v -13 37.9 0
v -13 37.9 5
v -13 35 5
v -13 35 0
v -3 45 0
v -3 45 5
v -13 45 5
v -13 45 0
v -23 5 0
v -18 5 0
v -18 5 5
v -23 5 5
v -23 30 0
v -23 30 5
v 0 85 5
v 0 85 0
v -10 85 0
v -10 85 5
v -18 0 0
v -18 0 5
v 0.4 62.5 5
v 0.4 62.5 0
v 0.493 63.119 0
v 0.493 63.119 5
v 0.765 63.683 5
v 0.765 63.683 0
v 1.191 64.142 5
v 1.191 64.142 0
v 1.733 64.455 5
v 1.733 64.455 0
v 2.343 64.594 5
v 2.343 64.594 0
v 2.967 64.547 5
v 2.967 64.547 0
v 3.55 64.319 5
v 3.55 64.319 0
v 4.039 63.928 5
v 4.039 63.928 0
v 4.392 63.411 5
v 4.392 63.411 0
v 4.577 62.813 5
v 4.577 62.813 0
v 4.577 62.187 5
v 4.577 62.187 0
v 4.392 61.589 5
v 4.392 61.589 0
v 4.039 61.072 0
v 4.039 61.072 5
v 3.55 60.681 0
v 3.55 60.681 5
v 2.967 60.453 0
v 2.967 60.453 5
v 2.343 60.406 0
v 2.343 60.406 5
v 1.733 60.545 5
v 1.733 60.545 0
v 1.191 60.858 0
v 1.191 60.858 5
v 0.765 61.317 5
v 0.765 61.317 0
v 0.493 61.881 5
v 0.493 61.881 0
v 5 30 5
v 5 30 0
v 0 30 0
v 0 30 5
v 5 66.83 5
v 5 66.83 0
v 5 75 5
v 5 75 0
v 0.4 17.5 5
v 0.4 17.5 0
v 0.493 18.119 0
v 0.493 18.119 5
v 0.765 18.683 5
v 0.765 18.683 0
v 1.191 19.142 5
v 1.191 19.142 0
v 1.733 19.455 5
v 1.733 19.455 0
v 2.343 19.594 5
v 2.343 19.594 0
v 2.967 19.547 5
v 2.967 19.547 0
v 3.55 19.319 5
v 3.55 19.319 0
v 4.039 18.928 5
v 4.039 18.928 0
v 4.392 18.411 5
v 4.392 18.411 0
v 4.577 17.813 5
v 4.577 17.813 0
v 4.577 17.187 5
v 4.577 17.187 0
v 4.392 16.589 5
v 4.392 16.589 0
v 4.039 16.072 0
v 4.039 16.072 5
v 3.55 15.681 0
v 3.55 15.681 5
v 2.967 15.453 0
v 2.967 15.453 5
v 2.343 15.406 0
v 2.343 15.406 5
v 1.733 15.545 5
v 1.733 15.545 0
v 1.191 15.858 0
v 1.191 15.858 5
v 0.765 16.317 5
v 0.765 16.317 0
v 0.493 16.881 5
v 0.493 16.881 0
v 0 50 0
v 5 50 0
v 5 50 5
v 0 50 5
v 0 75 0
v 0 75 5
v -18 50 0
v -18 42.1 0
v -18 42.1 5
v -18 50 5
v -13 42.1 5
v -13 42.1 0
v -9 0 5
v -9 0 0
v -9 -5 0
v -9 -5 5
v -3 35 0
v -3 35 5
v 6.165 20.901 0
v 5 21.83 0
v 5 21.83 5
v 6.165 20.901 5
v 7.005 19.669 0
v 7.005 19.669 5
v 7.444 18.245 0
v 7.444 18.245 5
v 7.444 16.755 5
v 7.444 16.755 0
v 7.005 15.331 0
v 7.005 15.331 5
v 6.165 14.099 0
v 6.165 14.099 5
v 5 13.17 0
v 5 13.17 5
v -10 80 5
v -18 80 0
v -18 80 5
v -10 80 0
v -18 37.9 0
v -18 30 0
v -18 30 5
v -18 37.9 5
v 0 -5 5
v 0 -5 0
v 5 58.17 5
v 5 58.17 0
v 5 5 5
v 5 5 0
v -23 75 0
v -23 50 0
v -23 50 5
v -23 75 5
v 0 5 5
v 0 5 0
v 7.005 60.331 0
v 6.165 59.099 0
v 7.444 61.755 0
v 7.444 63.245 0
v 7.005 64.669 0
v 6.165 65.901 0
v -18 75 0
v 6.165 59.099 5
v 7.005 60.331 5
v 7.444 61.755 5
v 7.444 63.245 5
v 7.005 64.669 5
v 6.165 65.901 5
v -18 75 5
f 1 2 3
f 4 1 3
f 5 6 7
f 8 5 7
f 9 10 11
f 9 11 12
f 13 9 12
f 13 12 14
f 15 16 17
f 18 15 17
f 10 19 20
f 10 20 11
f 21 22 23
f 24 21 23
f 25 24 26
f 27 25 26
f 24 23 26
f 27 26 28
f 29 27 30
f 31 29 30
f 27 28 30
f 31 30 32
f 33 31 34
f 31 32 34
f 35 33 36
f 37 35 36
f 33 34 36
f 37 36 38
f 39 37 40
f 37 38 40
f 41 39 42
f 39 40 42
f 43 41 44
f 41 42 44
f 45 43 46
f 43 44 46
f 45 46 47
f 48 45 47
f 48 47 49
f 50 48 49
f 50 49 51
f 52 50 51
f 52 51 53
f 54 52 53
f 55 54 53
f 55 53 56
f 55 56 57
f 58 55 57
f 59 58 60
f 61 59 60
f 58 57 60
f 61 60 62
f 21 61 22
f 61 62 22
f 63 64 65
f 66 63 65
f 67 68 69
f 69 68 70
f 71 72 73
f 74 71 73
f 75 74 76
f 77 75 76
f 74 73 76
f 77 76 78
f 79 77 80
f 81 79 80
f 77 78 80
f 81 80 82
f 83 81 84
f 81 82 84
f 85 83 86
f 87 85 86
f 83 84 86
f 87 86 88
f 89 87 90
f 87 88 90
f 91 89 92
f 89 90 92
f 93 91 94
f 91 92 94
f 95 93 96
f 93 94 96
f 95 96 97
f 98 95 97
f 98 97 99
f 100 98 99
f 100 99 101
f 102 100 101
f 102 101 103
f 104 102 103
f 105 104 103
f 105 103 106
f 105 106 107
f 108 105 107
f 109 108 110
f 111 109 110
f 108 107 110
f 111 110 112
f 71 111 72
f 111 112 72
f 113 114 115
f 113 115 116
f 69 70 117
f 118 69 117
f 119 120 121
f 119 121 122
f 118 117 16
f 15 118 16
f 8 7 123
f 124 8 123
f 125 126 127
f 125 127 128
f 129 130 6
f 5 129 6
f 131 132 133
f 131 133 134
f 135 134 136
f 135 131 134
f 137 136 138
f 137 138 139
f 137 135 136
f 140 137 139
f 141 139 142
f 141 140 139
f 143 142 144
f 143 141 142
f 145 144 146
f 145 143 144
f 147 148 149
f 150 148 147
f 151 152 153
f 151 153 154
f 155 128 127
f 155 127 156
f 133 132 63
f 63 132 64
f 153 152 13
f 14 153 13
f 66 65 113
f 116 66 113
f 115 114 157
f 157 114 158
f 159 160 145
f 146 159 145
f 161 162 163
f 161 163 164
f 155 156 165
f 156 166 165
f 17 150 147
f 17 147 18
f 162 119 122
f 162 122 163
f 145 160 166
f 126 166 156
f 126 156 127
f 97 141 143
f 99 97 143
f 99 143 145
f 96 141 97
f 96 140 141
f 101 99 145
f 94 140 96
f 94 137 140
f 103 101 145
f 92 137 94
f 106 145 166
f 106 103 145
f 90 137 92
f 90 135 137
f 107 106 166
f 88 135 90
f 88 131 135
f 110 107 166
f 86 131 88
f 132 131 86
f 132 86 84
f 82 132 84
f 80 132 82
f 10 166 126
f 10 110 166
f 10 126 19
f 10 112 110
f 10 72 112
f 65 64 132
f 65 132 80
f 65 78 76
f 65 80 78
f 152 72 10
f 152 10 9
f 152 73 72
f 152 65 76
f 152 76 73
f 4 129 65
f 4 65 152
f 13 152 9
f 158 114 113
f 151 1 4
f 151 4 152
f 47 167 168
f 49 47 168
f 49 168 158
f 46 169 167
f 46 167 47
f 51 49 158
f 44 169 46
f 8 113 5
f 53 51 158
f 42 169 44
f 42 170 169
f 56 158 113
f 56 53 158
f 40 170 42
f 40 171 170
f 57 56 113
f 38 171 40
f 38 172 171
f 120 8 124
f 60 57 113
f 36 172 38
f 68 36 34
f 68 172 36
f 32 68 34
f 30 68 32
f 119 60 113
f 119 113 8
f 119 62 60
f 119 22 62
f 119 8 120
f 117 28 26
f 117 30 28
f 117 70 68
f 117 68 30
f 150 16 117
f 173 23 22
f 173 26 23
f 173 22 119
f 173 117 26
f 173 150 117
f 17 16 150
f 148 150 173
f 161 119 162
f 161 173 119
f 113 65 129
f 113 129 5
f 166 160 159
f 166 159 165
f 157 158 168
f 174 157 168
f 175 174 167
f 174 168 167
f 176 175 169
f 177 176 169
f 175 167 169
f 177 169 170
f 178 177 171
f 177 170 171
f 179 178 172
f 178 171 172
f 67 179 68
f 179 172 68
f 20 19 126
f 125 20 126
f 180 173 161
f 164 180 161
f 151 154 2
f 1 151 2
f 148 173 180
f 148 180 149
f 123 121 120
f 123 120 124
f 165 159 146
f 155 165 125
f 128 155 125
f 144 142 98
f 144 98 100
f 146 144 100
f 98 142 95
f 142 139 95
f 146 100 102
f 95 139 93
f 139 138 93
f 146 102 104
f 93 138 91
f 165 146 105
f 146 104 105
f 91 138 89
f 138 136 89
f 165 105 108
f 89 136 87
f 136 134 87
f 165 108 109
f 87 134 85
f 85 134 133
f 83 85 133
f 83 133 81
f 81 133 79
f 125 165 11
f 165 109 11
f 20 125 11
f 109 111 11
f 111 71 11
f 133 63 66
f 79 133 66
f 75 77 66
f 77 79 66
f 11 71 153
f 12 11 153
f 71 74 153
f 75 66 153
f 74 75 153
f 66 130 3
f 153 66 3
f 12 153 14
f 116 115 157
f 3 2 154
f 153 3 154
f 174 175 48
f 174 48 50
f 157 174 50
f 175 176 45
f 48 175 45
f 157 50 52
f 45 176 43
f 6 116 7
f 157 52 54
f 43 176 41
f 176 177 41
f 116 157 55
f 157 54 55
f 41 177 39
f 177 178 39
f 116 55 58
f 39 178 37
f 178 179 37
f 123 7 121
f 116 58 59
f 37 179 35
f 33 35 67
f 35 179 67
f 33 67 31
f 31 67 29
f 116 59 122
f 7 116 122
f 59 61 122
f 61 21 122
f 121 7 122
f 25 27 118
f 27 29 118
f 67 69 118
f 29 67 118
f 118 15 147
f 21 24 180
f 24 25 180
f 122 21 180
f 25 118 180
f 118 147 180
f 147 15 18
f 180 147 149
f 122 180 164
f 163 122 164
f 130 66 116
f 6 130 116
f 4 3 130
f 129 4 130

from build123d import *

# Parameters (mm, degrees)
SKETCH1_W           = 18
SKETCH1_H           = 80
BOSS_EXTRUDE1_DEPTH = 5
SKETCH2_W           = 5
SKETCH2_H           = 25
BOSS_EXTRUDE2_DEPTH = 5
SKETCH3_W           = 9
SKETCH3_H           = 5
BOSS_EXTRUDE3_DEPTH = 5
SKETCH4_W           = 10
SKETCH4_H           = 5
BOSS_EXTRUDE4_DEPTH = 5
SKETCH5_R           = 2.1
CUT_EXTRUDE1_DEPTH  = 5
BOSS_EXTRUDE5_DEPTH = 5
SKETCH7_W           = 5
SKETCH7_H           = 4.2
CUT_EXTRUDE2_DEPTH  = 5


with BuildPart() as part:
    # Sketch1 → Boss-Extrude1 (new body)
    with BuildSketch(Plane.XY):
        with Locations((-9, 40)):
            Rectangle(SKETCH1_W, SKETCH1_H)
    extrude(amount=BOSS_EXTRUDE1_DEPTH)

    # Sketch2 → Boss-Extrude2 (add)
    with BuildSketch(Plane(origin=(0, 0, 0), x_dir=(-1, 0, 0), z_dir=(0, 0, -1))):
        with Locations((-2.5, 62.5)):
            Rectangle(SKETCH2_W, SKETCH2_H)
        with Locations((-2.5, 17.5)):
            Rectangle(SKETCH2_W, SKETCH2_H)
        with Locations((20.5, 17.5)):
            Rectangle(SKETCH2_W, SKETCH2_H)
        with Locations((20.5, 62.5)):
            Rectangle(SKETCH2_W, SKETCH2_H)
    extrude(amount=-BOSS_EXTRUDE2_DEPTH)

    # Sketch3 → Boss-Extrude3 (add)
    with BuildSketch(Plane.XZ):
        with Locations((-4.5, 2.5)):
            Rectangle(SKETCH3_W, SKETCH3_H)
    extrude(amount=BOSS_EXTRUDE3_DEPTH)

    # Sketch4 → Boss-Extrude4 (add)
    with BuildSketch(Plane(origin=(0, 0, 0), x_dir=(-1, 0, 0), z_dir=(0, 0, -1))):
        with Locations((5, 82.5)):
            Rectangle(SKETCH4_W, SKETCH4_H)
    extrude(amount=-BOSS_EXTRUDE4_DEPTH)

    # Sketch5 → Cut-Extrude1 (cut)
    with BuildSketch(Plane(origin=(0, 0, 0), x_dir=(-1, 0, 0), z_dir=(0, 0, -1))):
        with Locations((-2.5, 62.5)):
            Circle(SKETCH5_R)
        with Locations((-2.5, 17.5)):
            Circle(SKETCH5_R)
    extrude(amount=-CUT_EXTRUDE1_DEPTH, mode=Mode.SUBTRACT)

    # Sketch6 → Boss-Extrude5 (add)
    with BuildSketch(Plane(origin=(0, 0, 0), x_dir=(-1, 0, 0), z_dir=(0, 0, -1))):
        with BuildLine():
            Line((-5, 66.830127019), (-5, 58.169872981))
            ThreePointArc((-5, 58.169872981), (-7.5, 62.5), (-5, 66.830127019))
        make_face()
        with BuildLine():
            Line((-5, 13.169872981), (-5, 21.830127019))
            ThreePointArc((-5, 21.830127019), (-7.5, 17.5), (-5, 13.169872981))
        make_face()
    extrude(amount=-BOSS_EXTRUDE5_DEPTH)

    # Sketch7 → Cut-Extrude2 (cut)
    with BuildSketch(Plane.XY.offset(5)):
        Polygon((-13, 45), (-13, 42.1), (-13, 37.9), (-13, 35), (-3, 35), (-3, 45), align=None)
        with Locations((-15.5, 40)):
            Rectangle(SKETCH7_W, SKETCH7_H)
    extrude(amount=-CUT_EXTRUDE2_DEPTH, mode=Mode.SUBTRACT)


solid = part.part
